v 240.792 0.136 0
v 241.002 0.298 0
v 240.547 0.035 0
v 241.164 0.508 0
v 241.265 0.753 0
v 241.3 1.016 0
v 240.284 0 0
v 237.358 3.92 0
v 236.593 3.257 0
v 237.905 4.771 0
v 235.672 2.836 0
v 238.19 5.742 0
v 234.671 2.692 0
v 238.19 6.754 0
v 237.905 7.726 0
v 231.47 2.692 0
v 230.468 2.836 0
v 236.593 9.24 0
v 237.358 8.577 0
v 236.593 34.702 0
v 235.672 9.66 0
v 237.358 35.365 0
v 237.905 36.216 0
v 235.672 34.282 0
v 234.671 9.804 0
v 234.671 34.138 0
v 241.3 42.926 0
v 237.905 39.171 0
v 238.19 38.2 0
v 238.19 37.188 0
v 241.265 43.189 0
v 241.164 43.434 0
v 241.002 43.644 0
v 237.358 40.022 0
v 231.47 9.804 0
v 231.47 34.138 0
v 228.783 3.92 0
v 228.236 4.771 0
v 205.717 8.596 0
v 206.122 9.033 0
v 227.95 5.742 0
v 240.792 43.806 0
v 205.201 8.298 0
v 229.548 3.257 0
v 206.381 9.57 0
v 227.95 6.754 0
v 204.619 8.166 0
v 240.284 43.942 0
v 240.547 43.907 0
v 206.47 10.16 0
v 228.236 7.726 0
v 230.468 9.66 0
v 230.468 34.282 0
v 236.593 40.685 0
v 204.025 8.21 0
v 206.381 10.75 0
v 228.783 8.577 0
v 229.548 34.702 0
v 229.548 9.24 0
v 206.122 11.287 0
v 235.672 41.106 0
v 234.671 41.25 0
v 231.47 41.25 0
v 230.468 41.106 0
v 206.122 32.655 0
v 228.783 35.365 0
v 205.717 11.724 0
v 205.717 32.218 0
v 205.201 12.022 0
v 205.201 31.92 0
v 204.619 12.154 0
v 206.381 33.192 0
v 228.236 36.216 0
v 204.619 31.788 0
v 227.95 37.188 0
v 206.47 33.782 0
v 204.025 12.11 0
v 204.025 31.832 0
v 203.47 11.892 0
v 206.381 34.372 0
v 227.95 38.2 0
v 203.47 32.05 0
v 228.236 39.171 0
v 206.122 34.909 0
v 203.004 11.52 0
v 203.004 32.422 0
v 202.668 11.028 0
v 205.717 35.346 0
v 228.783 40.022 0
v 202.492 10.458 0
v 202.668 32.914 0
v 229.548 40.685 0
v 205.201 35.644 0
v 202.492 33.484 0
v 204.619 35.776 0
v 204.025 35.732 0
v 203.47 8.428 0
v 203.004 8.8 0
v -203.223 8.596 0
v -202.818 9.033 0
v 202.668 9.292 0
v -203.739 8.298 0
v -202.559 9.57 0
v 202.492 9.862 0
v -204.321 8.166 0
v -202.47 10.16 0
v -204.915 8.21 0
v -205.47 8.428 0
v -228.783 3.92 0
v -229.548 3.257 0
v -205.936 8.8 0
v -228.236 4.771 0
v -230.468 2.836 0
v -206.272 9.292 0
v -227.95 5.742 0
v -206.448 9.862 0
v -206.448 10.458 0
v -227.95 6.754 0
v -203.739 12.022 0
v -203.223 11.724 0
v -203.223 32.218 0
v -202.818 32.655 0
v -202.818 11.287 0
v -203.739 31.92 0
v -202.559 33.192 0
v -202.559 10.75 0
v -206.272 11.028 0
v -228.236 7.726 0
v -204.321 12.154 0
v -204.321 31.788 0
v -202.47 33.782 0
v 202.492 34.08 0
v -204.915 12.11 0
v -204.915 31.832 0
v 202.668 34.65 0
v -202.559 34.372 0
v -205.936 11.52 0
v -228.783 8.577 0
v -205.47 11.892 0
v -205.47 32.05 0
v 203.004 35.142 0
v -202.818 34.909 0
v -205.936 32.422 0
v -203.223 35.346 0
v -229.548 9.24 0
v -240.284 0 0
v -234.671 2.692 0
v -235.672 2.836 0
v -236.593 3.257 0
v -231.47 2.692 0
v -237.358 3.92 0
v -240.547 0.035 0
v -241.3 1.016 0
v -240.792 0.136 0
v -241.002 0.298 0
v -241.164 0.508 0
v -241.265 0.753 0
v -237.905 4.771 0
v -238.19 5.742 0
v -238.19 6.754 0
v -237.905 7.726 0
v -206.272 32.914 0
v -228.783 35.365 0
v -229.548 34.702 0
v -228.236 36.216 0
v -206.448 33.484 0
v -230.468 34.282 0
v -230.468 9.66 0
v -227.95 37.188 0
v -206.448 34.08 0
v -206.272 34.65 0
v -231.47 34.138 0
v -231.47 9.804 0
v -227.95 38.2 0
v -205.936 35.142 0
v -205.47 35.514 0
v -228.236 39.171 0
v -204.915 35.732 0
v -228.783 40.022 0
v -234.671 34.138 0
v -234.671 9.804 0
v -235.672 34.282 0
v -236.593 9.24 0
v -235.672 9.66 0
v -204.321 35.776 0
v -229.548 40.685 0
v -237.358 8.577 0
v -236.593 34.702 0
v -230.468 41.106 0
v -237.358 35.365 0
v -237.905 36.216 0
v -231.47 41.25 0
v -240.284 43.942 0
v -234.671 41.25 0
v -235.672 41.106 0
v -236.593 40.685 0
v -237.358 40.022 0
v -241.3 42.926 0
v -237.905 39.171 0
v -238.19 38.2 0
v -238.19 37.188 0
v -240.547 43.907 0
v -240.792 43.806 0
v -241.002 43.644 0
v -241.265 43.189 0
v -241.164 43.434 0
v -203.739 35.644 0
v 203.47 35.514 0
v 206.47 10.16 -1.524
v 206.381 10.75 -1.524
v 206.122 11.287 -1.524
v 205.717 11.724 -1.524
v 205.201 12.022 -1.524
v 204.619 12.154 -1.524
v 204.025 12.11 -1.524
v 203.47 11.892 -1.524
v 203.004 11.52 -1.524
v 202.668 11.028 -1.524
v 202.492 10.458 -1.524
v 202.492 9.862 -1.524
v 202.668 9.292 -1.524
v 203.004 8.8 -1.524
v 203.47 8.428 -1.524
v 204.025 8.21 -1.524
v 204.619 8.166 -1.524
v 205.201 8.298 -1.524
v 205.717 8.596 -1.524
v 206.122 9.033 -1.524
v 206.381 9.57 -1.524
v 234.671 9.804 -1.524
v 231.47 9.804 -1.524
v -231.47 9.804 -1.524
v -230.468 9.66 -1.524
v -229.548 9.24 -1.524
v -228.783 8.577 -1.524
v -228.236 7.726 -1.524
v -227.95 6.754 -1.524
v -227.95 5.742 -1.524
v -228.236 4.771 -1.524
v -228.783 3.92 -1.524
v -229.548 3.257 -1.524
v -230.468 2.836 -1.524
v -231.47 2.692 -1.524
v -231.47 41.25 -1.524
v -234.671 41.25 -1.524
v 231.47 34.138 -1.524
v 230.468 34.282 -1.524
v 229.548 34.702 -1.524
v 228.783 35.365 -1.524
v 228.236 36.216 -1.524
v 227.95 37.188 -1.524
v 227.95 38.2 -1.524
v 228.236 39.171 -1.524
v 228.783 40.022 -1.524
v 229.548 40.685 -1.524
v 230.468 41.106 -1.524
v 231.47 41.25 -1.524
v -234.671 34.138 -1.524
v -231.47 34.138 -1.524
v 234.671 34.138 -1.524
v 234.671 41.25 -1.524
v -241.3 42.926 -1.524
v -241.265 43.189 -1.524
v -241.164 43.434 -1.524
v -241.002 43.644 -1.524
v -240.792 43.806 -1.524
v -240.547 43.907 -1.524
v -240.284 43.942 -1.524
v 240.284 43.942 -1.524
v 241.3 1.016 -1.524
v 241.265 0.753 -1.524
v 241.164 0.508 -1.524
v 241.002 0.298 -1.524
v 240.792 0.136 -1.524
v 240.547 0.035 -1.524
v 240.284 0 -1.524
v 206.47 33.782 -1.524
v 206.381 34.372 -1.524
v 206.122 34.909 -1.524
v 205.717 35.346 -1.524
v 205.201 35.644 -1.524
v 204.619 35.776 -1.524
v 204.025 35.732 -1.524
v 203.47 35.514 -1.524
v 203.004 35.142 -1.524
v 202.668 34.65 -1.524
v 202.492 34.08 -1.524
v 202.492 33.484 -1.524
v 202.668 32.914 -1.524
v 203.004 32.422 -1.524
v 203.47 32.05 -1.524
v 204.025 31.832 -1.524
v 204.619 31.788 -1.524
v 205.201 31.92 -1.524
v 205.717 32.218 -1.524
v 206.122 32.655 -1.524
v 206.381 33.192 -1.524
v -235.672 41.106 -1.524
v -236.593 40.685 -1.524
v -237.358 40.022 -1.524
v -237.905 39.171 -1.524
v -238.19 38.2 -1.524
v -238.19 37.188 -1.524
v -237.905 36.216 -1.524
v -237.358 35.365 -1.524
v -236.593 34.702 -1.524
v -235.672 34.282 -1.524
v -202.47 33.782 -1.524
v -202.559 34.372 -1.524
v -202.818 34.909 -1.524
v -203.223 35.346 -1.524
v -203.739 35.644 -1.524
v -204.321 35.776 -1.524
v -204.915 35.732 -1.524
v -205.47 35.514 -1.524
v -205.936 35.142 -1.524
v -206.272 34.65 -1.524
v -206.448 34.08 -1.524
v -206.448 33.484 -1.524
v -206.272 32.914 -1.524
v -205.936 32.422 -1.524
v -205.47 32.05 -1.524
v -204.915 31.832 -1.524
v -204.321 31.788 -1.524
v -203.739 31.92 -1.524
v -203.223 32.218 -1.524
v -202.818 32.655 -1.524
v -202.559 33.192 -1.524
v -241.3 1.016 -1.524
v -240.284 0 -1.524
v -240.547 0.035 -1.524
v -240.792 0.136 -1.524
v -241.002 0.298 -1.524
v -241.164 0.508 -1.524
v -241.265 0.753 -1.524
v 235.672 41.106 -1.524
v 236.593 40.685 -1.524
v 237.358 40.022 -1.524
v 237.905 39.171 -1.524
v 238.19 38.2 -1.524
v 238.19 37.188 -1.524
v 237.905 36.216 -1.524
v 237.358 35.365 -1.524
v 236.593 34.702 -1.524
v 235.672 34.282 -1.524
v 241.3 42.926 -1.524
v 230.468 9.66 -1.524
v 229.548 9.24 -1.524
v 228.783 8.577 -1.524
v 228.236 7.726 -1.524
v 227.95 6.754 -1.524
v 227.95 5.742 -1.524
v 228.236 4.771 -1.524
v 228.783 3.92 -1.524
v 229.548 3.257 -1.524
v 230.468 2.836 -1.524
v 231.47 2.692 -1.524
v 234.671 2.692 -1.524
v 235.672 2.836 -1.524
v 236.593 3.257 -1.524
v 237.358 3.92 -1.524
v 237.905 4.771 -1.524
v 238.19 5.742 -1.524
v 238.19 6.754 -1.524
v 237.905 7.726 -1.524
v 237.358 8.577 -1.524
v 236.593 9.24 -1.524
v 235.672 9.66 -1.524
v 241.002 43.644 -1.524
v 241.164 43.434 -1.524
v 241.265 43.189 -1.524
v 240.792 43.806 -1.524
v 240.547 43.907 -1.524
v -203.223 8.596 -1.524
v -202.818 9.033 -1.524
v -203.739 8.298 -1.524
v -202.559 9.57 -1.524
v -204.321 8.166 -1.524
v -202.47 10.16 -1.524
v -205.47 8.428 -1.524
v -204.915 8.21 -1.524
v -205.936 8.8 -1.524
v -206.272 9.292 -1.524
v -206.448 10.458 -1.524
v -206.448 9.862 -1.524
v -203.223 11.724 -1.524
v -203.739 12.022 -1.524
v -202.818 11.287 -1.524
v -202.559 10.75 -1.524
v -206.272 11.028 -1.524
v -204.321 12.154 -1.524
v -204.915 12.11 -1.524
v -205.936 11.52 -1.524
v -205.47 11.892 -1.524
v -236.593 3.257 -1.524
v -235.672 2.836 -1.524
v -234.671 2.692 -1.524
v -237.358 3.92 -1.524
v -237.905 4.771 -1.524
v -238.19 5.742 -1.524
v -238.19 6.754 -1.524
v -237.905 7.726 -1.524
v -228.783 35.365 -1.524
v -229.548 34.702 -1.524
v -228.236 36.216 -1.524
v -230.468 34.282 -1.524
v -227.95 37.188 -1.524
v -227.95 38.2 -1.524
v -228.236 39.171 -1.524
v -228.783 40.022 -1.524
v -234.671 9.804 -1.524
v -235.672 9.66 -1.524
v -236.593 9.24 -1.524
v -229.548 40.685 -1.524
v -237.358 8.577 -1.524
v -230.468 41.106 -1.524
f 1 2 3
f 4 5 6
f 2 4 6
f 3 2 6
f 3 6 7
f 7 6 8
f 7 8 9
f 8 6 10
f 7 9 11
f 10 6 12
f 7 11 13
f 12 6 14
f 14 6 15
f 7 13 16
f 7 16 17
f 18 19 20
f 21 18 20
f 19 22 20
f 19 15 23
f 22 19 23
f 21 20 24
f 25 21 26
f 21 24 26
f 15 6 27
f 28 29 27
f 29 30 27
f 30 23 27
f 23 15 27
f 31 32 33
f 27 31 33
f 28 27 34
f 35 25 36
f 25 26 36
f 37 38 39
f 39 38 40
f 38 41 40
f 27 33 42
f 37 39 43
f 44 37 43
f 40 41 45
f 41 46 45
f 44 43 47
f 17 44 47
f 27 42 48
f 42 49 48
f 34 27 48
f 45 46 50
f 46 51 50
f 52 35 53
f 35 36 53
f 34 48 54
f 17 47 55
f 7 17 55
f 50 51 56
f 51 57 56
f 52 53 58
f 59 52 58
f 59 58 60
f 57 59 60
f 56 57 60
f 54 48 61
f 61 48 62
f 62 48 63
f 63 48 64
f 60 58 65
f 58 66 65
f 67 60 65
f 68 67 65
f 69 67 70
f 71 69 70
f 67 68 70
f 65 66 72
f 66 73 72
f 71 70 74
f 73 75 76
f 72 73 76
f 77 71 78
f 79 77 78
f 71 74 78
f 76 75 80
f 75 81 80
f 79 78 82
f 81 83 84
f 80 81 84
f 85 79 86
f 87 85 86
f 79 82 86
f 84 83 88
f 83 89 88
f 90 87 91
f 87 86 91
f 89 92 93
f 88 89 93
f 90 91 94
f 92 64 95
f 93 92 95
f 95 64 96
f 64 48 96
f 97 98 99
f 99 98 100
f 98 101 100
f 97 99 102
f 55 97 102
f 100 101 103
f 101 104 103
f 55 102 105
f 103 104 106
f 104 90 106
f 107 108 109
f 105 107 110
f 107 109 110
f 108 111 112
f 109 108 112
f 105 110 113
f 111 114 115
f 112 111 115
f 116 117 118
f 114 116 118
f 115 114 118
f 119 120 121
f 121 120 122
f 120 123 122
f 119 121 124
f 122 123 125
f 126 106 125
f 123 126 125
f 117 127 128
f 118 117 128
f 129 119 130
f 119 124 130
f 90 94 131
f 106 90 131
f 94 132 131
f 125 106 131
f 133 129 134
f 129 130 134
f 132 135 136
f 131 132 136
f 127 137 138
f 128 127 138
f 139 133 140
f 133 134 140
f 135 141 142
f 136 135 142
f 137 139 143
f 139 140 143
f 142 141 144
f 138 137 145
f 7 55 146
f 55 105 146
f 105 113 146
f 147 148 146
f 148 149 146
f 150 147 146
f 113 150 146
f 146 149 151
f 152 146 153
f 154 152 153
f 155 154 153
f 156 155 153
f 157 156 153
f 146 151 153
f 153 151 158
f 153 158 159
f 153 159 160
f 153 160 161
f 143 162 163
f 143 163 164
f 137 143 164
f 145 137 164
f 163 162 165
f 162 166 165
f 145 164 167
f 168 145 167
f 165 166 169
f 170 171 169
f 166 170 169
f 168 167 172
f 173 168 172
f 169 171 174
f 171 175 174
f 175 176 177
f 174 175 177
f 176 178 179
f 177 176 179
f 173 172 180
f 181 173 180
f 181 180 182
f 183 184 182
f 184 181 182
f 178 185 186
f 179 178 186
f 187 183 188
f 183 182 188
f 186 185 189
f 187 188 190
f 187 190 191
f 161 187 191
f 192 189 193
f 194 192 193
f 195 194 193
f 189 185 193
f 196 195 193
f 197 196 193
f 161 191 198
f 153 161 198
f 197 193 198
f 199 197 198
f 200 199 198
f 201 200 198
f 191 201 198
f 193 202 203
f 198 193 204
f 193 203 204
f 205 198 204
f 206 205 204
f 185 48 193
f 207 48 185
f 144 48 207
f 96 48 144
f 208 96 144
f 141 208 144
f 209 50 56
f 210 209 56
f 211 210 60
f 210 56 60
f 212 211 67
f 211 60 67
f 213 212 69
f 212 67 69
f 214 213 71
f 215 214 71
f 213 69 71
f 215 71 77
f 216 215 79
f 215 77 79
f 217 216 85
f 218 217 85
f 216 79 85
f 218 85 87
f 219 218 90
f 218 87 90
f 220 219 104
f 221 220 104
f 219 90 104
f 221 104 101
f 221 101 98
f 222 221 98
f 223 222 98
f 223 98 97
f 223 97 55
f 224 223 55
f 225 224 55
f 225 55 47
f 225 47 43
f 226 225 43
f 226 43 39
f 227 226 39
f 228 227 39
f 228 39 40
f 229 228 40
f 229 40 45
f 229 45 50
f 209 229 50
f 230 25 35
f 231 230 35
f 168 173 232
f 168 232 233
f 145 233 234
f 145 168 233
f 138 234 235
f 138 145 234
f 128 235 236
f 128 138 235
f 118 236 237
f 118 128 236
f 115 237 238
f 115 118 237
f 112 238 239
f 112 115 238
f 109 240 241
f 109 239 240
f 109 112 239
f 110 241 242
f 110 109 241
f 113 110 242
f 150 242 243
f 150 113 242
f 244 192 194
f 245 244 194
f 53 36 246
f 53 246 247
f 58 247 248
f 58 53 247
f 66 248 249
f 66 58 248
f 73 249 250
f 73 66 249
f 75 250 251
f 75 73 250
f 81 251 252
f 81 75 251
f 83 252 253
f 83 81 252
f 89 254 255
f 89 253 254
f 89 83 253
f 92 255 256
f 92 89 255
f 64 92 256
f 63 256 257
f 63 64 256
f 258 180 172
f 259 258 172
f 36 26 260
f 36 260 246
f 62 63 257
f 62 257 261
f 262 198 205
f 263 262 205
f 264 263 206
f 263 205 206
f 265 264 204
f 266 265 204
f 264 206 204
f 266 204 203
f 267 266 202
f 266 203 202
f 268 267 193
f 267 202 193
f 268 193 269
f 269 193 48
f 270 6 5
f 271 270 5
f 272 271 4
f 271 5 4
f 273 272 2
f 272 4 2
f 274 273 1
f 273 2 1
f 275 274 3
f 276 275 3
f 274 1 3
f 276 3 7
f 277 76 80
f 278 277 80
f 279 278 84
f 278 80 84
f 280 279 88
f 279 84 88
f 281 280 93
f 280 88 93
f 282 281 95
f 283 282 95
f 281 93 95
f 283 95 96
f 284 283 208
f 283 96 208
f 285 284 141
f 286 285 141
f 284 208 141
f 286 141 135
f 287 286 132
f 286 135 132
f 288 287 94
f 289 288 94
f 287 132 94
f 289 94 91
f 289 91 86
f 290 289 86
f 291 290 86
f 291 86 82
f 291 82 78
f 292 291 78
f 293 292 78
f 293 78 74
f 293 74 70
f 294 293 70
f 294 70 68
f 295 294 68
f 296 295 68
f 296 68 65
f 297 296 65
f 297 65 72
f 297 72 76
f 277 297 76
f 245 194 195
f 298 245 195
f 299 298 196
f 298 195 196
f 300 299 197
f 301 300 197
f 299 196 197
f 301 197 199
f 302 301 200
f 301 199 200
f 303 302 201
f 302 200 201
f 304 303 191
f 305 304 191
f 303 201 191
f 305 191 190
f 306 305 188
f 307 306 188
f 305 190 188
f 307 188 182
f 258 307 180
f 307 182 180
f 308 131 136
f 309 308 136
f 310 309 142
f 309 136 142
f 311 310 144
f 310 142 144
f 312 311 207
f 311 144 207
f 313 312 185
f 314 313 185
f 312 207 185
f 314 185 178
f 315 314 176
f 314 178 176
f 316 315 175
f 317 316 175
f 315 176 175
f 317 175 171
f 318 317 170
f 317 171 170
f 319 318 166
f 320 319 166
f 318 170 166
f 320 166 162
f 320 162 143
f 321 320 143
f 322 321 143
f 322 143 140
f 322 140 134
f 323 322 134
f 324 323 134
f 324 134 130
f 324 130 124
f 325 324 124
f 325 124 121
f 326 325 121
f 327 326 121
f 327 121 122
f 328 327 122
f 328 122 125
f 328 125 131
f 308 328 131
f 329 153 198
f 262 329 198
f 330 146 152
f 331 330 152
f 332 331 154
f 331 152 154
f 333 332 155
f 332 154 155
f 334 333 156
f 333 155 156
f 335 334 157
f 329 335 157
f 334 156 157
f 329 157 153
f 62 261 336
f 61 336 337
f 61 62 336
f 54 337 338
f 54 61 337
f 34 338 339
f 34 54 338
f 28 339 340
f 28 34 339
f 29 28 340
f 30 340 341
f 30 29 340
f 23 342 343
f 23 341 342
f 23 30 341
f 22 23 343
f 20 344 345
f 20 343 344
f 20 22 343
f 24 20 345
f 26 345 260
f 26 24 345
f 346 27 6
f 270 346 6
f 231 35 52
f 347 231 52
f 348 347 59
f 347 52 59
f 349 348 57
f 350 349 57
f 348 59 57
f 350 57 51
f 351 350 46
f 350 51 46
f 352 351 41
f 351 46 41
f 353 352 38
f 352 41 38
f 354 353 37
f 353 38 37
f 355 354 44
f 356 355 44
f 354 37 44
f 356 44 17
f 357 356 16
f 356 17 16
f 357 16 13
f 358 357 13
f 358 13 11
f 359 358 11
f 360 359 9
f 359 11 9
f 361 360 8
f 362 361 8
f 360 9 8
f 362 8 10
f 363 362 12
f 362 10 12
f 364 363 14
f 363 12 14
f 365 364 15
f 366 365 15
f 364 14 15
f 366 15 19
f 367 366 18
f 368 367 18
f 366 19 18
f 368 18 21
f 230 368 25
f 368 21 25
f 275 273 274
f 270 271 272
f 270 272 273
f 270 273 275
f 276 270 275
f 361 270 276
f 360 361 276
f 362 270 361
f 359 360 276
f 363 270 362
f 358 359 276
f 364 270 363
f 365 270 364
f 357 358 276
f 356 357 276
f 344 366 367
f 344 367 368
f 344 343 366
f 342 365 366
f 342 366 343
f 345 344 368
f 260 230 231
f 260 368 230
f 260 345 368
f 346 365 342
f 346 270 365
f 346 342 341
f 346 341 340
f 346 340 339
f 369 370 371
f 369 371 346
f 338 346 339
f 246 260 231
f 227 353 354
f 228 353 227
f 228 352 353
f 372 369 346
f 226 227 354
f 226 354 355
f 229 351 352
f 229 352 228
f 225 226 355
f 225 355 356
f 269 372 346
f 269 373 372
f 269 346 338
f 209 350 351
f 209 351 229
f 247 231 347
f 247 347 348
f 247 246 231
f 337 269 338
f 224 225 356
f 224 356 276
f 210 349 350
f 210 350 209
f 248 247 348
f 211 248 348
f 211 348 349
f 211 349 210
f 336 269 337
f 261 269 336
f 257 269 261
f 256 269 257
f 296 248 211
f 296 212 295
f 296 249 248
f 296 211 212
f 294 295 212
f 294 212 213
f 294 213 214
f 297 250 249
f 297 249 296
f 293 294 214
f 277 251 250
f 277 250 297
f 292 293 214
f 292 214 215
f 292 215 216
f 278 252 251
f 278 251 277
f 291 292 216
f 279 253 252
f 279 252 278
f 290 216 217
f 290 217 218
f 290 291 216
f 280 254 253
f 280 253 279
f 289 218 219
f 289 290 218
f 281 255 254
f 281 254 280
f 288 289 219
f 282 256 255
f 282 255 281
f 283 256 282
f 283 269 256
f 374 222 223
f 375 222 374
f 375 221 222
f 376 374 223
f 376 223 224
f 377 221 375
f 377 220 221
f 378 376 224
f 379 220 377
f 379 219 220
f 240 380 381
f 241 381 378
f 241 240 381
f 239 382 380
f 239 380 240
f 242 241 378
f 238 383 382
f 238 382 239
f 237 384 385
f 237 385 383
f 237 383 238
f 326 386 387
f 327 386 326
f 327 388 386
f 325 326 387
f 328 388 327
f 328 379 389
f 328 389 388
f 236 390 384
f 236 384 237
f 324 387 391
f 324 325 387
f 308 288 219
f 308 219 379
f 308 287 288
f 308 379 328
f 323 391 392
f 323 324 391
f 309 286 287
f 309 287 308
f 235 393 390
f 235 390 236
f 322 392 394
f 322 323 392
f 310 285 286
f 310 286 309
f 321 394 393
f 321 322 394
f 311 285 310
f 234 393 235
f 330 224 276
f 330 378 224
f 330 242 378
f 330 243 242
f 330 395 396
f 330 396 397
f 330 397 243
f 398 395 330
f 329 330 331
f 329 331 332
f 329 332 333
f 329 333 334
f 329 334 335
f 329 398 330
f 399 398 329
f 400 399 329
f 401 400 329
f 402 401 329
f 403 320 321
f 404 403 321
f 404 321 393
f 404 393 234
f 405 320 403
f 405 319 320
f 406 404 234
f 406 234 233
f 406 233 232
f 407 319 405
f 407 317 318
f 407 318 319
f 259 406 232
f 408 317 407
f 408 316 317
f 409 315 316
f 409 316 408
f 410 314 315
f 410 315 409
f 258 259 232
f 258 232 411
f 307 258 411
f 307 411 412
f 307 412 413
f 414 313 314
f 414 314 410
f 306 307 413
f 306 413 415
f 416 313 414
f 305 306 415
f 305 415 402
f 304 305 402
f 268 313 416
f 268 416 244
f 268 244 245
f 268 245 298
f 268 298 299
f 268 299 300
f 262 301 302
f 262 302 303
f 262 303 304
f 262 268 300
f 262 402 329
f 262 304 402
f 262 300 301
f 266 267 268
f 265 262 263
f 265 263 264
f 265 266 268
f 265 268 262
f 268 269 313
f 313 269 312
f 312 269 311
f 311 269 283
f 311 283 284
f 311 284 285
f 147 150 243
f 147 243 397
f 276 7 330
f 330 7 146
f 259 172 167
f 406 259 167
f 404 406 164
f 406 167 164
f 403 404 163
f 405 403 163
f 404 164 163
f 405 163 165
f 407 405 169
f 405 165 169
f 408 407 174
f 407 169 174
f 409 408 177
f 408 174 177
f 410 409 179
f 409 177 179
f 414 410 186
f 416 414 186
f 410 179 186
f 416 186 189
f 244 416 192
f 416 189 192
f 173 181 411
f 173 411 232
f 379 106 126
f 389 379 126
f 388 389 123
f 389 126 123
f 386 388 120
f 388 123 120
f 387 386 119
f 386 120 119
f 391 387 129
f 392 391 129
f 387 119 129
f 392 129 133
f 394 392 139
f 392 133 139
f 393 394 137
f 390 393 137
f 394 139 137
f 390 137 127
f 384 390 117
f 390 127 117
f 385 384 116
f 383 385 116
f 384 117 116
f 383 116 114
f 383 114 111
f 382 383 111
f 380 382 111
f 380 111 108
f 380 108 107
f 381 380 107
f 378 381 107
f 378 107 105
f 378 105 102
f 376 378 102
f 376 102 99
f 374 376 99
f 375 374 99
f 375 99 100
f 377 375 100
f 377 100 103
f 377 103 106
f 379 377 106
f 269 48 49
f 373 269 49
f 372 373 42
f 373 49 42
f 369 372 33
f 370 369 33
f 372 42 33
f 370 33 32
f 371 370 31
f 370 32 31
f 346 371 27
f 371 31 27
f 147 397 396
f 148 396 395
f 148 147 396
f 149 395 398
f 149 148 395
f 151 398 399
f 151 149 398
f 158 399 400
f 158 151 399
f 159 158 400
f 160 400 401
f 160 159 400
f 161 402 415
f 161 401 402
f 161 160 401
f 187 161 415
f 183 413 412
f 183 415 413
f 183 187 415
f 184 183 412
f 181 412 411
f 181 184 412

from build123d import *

# Parameters (mm, degrees)
BASE_FLANGE1_DEPTH         = 1.524
CUT_EXTRUDE_MOUNTING_DEPTH = 246.27313742
SKETCH5_R                  = 2
CUT_EXTRUDE_COVER_DEPTH    = 2.54


# Sheet-metal steps are written as plain solids
with BuildPart() as part:
    # Sketch1 → Base-Flange1 (new body)
    with BuildSketch(Plane.XY):
        with BuildLine():
            Line((241.3, 42.926), (241.3, 1.016))
            ThreePointArc((241.3, 1.016), (241.00242049, 0.29757951), (240.284, 0))
            Line((240.284, 0), (-240.284, 0))
            ThreePointArc((-240.284, 0), (-241.00242049, 0.29757951), (-241.3, 1.016))
            Line((-241.3, 1.016), (-241.3, 42.926))
            ThreePointArc((-241.3, 42.926), (-241.00242049, 43.64442049), (-240.284, 43.942))
            Line((-240.284, 43.942), (240.284, 43.942))
            ThreePointArc((240.284, 43.942), (241.00242049, 43.64442049), (241.3, 42.926))
        make_face()
    extrude(amount=-BASE_FLANGE1_DEPTH)

    # Sketch2 → Cut-Extrude-Mounting (cut, through all)
    with BuildSketch(Plane.XY):
        with BuildLine():
            Line((-234.6706, 9.8044), (-231.4702, 9.8044))
            ThreePointArc((-231.4702, 9.8044), (-227.9142, 6.2484), (-231.4702, 2.6924))
            Line((-231.4702, 2.6924), (-234.6706, 2.6924))
            ThreePointArc((-234.6706, 2.6924), (-238.2266, 6.2484), (-234.6706, 9.8044))
        make_face()
        with BuildLine():
            Line((-234.6706, 34.1376), (-231.4702, 34.1376))
            ThreePointArc((-231.4702, 34.1376), (-227.9142, 37.6936), (-231.4702, 41.2496))
            Line((-231.4702, 41.2496), (-234.6706, 41.2496))
            ThreePointArc((-234.6706, 41.2496), (-238.2266, 37.6936), (-234.6706, 34.1376))
        make_face()
        with BuildLine():
            Line((234.6706, 9.8044), (231.4702, 9.8044))
            ThreePointArc((231.4702, 9.8044), (227.9142, 6.2484), (231.4702, 2.6924))
            Line((231.4702, 2.6924), (234.6706, 2.6924))
            ThreePointArc((234.6706, 2.6924), (238.2266, 6.2484), (234.6706, 9.8044))
        make_face()
        with BuildLine():
            Line((234.6706, 34.1376), (231.4702, 34.1376))
            ThreePointArc((231.4702, 34.1376), (227.9142, 37.6936), (231.4702, 41.2496))
            Line((231.4702, 41.2496), (234.6706, 41.2496))
            ThreePointArc((234.6706, 41.2496), (238.2266, 37.6936), (234.6706, 34.1376))
        make_face()
    extrude(amount=-CUT_EXTRUDE_MOUNTING_DEPTH, mode=Mode.SUBTRACT)

    # Sketch5 → Cut-Extrude-Cover (cut)
    with BuildSketch(Plane.XY):
        with Locations((-204.47, 33.782)):
            Circle(SKETCH5_R)
        with Locations((-204.47, 10.16)):
            Circle(SKETCH5_R)
        with Locations((204.47, 10.16)):
            Circle(SKETCH5_R)
        with Locations((204.47, 33.782)):
            Circle(SKETCH5_R)
    extrude(amount=-CUT_EXTRUDE_COVER_DEPTH, mode=Mode.SUBTRACT)


solid = part.part
